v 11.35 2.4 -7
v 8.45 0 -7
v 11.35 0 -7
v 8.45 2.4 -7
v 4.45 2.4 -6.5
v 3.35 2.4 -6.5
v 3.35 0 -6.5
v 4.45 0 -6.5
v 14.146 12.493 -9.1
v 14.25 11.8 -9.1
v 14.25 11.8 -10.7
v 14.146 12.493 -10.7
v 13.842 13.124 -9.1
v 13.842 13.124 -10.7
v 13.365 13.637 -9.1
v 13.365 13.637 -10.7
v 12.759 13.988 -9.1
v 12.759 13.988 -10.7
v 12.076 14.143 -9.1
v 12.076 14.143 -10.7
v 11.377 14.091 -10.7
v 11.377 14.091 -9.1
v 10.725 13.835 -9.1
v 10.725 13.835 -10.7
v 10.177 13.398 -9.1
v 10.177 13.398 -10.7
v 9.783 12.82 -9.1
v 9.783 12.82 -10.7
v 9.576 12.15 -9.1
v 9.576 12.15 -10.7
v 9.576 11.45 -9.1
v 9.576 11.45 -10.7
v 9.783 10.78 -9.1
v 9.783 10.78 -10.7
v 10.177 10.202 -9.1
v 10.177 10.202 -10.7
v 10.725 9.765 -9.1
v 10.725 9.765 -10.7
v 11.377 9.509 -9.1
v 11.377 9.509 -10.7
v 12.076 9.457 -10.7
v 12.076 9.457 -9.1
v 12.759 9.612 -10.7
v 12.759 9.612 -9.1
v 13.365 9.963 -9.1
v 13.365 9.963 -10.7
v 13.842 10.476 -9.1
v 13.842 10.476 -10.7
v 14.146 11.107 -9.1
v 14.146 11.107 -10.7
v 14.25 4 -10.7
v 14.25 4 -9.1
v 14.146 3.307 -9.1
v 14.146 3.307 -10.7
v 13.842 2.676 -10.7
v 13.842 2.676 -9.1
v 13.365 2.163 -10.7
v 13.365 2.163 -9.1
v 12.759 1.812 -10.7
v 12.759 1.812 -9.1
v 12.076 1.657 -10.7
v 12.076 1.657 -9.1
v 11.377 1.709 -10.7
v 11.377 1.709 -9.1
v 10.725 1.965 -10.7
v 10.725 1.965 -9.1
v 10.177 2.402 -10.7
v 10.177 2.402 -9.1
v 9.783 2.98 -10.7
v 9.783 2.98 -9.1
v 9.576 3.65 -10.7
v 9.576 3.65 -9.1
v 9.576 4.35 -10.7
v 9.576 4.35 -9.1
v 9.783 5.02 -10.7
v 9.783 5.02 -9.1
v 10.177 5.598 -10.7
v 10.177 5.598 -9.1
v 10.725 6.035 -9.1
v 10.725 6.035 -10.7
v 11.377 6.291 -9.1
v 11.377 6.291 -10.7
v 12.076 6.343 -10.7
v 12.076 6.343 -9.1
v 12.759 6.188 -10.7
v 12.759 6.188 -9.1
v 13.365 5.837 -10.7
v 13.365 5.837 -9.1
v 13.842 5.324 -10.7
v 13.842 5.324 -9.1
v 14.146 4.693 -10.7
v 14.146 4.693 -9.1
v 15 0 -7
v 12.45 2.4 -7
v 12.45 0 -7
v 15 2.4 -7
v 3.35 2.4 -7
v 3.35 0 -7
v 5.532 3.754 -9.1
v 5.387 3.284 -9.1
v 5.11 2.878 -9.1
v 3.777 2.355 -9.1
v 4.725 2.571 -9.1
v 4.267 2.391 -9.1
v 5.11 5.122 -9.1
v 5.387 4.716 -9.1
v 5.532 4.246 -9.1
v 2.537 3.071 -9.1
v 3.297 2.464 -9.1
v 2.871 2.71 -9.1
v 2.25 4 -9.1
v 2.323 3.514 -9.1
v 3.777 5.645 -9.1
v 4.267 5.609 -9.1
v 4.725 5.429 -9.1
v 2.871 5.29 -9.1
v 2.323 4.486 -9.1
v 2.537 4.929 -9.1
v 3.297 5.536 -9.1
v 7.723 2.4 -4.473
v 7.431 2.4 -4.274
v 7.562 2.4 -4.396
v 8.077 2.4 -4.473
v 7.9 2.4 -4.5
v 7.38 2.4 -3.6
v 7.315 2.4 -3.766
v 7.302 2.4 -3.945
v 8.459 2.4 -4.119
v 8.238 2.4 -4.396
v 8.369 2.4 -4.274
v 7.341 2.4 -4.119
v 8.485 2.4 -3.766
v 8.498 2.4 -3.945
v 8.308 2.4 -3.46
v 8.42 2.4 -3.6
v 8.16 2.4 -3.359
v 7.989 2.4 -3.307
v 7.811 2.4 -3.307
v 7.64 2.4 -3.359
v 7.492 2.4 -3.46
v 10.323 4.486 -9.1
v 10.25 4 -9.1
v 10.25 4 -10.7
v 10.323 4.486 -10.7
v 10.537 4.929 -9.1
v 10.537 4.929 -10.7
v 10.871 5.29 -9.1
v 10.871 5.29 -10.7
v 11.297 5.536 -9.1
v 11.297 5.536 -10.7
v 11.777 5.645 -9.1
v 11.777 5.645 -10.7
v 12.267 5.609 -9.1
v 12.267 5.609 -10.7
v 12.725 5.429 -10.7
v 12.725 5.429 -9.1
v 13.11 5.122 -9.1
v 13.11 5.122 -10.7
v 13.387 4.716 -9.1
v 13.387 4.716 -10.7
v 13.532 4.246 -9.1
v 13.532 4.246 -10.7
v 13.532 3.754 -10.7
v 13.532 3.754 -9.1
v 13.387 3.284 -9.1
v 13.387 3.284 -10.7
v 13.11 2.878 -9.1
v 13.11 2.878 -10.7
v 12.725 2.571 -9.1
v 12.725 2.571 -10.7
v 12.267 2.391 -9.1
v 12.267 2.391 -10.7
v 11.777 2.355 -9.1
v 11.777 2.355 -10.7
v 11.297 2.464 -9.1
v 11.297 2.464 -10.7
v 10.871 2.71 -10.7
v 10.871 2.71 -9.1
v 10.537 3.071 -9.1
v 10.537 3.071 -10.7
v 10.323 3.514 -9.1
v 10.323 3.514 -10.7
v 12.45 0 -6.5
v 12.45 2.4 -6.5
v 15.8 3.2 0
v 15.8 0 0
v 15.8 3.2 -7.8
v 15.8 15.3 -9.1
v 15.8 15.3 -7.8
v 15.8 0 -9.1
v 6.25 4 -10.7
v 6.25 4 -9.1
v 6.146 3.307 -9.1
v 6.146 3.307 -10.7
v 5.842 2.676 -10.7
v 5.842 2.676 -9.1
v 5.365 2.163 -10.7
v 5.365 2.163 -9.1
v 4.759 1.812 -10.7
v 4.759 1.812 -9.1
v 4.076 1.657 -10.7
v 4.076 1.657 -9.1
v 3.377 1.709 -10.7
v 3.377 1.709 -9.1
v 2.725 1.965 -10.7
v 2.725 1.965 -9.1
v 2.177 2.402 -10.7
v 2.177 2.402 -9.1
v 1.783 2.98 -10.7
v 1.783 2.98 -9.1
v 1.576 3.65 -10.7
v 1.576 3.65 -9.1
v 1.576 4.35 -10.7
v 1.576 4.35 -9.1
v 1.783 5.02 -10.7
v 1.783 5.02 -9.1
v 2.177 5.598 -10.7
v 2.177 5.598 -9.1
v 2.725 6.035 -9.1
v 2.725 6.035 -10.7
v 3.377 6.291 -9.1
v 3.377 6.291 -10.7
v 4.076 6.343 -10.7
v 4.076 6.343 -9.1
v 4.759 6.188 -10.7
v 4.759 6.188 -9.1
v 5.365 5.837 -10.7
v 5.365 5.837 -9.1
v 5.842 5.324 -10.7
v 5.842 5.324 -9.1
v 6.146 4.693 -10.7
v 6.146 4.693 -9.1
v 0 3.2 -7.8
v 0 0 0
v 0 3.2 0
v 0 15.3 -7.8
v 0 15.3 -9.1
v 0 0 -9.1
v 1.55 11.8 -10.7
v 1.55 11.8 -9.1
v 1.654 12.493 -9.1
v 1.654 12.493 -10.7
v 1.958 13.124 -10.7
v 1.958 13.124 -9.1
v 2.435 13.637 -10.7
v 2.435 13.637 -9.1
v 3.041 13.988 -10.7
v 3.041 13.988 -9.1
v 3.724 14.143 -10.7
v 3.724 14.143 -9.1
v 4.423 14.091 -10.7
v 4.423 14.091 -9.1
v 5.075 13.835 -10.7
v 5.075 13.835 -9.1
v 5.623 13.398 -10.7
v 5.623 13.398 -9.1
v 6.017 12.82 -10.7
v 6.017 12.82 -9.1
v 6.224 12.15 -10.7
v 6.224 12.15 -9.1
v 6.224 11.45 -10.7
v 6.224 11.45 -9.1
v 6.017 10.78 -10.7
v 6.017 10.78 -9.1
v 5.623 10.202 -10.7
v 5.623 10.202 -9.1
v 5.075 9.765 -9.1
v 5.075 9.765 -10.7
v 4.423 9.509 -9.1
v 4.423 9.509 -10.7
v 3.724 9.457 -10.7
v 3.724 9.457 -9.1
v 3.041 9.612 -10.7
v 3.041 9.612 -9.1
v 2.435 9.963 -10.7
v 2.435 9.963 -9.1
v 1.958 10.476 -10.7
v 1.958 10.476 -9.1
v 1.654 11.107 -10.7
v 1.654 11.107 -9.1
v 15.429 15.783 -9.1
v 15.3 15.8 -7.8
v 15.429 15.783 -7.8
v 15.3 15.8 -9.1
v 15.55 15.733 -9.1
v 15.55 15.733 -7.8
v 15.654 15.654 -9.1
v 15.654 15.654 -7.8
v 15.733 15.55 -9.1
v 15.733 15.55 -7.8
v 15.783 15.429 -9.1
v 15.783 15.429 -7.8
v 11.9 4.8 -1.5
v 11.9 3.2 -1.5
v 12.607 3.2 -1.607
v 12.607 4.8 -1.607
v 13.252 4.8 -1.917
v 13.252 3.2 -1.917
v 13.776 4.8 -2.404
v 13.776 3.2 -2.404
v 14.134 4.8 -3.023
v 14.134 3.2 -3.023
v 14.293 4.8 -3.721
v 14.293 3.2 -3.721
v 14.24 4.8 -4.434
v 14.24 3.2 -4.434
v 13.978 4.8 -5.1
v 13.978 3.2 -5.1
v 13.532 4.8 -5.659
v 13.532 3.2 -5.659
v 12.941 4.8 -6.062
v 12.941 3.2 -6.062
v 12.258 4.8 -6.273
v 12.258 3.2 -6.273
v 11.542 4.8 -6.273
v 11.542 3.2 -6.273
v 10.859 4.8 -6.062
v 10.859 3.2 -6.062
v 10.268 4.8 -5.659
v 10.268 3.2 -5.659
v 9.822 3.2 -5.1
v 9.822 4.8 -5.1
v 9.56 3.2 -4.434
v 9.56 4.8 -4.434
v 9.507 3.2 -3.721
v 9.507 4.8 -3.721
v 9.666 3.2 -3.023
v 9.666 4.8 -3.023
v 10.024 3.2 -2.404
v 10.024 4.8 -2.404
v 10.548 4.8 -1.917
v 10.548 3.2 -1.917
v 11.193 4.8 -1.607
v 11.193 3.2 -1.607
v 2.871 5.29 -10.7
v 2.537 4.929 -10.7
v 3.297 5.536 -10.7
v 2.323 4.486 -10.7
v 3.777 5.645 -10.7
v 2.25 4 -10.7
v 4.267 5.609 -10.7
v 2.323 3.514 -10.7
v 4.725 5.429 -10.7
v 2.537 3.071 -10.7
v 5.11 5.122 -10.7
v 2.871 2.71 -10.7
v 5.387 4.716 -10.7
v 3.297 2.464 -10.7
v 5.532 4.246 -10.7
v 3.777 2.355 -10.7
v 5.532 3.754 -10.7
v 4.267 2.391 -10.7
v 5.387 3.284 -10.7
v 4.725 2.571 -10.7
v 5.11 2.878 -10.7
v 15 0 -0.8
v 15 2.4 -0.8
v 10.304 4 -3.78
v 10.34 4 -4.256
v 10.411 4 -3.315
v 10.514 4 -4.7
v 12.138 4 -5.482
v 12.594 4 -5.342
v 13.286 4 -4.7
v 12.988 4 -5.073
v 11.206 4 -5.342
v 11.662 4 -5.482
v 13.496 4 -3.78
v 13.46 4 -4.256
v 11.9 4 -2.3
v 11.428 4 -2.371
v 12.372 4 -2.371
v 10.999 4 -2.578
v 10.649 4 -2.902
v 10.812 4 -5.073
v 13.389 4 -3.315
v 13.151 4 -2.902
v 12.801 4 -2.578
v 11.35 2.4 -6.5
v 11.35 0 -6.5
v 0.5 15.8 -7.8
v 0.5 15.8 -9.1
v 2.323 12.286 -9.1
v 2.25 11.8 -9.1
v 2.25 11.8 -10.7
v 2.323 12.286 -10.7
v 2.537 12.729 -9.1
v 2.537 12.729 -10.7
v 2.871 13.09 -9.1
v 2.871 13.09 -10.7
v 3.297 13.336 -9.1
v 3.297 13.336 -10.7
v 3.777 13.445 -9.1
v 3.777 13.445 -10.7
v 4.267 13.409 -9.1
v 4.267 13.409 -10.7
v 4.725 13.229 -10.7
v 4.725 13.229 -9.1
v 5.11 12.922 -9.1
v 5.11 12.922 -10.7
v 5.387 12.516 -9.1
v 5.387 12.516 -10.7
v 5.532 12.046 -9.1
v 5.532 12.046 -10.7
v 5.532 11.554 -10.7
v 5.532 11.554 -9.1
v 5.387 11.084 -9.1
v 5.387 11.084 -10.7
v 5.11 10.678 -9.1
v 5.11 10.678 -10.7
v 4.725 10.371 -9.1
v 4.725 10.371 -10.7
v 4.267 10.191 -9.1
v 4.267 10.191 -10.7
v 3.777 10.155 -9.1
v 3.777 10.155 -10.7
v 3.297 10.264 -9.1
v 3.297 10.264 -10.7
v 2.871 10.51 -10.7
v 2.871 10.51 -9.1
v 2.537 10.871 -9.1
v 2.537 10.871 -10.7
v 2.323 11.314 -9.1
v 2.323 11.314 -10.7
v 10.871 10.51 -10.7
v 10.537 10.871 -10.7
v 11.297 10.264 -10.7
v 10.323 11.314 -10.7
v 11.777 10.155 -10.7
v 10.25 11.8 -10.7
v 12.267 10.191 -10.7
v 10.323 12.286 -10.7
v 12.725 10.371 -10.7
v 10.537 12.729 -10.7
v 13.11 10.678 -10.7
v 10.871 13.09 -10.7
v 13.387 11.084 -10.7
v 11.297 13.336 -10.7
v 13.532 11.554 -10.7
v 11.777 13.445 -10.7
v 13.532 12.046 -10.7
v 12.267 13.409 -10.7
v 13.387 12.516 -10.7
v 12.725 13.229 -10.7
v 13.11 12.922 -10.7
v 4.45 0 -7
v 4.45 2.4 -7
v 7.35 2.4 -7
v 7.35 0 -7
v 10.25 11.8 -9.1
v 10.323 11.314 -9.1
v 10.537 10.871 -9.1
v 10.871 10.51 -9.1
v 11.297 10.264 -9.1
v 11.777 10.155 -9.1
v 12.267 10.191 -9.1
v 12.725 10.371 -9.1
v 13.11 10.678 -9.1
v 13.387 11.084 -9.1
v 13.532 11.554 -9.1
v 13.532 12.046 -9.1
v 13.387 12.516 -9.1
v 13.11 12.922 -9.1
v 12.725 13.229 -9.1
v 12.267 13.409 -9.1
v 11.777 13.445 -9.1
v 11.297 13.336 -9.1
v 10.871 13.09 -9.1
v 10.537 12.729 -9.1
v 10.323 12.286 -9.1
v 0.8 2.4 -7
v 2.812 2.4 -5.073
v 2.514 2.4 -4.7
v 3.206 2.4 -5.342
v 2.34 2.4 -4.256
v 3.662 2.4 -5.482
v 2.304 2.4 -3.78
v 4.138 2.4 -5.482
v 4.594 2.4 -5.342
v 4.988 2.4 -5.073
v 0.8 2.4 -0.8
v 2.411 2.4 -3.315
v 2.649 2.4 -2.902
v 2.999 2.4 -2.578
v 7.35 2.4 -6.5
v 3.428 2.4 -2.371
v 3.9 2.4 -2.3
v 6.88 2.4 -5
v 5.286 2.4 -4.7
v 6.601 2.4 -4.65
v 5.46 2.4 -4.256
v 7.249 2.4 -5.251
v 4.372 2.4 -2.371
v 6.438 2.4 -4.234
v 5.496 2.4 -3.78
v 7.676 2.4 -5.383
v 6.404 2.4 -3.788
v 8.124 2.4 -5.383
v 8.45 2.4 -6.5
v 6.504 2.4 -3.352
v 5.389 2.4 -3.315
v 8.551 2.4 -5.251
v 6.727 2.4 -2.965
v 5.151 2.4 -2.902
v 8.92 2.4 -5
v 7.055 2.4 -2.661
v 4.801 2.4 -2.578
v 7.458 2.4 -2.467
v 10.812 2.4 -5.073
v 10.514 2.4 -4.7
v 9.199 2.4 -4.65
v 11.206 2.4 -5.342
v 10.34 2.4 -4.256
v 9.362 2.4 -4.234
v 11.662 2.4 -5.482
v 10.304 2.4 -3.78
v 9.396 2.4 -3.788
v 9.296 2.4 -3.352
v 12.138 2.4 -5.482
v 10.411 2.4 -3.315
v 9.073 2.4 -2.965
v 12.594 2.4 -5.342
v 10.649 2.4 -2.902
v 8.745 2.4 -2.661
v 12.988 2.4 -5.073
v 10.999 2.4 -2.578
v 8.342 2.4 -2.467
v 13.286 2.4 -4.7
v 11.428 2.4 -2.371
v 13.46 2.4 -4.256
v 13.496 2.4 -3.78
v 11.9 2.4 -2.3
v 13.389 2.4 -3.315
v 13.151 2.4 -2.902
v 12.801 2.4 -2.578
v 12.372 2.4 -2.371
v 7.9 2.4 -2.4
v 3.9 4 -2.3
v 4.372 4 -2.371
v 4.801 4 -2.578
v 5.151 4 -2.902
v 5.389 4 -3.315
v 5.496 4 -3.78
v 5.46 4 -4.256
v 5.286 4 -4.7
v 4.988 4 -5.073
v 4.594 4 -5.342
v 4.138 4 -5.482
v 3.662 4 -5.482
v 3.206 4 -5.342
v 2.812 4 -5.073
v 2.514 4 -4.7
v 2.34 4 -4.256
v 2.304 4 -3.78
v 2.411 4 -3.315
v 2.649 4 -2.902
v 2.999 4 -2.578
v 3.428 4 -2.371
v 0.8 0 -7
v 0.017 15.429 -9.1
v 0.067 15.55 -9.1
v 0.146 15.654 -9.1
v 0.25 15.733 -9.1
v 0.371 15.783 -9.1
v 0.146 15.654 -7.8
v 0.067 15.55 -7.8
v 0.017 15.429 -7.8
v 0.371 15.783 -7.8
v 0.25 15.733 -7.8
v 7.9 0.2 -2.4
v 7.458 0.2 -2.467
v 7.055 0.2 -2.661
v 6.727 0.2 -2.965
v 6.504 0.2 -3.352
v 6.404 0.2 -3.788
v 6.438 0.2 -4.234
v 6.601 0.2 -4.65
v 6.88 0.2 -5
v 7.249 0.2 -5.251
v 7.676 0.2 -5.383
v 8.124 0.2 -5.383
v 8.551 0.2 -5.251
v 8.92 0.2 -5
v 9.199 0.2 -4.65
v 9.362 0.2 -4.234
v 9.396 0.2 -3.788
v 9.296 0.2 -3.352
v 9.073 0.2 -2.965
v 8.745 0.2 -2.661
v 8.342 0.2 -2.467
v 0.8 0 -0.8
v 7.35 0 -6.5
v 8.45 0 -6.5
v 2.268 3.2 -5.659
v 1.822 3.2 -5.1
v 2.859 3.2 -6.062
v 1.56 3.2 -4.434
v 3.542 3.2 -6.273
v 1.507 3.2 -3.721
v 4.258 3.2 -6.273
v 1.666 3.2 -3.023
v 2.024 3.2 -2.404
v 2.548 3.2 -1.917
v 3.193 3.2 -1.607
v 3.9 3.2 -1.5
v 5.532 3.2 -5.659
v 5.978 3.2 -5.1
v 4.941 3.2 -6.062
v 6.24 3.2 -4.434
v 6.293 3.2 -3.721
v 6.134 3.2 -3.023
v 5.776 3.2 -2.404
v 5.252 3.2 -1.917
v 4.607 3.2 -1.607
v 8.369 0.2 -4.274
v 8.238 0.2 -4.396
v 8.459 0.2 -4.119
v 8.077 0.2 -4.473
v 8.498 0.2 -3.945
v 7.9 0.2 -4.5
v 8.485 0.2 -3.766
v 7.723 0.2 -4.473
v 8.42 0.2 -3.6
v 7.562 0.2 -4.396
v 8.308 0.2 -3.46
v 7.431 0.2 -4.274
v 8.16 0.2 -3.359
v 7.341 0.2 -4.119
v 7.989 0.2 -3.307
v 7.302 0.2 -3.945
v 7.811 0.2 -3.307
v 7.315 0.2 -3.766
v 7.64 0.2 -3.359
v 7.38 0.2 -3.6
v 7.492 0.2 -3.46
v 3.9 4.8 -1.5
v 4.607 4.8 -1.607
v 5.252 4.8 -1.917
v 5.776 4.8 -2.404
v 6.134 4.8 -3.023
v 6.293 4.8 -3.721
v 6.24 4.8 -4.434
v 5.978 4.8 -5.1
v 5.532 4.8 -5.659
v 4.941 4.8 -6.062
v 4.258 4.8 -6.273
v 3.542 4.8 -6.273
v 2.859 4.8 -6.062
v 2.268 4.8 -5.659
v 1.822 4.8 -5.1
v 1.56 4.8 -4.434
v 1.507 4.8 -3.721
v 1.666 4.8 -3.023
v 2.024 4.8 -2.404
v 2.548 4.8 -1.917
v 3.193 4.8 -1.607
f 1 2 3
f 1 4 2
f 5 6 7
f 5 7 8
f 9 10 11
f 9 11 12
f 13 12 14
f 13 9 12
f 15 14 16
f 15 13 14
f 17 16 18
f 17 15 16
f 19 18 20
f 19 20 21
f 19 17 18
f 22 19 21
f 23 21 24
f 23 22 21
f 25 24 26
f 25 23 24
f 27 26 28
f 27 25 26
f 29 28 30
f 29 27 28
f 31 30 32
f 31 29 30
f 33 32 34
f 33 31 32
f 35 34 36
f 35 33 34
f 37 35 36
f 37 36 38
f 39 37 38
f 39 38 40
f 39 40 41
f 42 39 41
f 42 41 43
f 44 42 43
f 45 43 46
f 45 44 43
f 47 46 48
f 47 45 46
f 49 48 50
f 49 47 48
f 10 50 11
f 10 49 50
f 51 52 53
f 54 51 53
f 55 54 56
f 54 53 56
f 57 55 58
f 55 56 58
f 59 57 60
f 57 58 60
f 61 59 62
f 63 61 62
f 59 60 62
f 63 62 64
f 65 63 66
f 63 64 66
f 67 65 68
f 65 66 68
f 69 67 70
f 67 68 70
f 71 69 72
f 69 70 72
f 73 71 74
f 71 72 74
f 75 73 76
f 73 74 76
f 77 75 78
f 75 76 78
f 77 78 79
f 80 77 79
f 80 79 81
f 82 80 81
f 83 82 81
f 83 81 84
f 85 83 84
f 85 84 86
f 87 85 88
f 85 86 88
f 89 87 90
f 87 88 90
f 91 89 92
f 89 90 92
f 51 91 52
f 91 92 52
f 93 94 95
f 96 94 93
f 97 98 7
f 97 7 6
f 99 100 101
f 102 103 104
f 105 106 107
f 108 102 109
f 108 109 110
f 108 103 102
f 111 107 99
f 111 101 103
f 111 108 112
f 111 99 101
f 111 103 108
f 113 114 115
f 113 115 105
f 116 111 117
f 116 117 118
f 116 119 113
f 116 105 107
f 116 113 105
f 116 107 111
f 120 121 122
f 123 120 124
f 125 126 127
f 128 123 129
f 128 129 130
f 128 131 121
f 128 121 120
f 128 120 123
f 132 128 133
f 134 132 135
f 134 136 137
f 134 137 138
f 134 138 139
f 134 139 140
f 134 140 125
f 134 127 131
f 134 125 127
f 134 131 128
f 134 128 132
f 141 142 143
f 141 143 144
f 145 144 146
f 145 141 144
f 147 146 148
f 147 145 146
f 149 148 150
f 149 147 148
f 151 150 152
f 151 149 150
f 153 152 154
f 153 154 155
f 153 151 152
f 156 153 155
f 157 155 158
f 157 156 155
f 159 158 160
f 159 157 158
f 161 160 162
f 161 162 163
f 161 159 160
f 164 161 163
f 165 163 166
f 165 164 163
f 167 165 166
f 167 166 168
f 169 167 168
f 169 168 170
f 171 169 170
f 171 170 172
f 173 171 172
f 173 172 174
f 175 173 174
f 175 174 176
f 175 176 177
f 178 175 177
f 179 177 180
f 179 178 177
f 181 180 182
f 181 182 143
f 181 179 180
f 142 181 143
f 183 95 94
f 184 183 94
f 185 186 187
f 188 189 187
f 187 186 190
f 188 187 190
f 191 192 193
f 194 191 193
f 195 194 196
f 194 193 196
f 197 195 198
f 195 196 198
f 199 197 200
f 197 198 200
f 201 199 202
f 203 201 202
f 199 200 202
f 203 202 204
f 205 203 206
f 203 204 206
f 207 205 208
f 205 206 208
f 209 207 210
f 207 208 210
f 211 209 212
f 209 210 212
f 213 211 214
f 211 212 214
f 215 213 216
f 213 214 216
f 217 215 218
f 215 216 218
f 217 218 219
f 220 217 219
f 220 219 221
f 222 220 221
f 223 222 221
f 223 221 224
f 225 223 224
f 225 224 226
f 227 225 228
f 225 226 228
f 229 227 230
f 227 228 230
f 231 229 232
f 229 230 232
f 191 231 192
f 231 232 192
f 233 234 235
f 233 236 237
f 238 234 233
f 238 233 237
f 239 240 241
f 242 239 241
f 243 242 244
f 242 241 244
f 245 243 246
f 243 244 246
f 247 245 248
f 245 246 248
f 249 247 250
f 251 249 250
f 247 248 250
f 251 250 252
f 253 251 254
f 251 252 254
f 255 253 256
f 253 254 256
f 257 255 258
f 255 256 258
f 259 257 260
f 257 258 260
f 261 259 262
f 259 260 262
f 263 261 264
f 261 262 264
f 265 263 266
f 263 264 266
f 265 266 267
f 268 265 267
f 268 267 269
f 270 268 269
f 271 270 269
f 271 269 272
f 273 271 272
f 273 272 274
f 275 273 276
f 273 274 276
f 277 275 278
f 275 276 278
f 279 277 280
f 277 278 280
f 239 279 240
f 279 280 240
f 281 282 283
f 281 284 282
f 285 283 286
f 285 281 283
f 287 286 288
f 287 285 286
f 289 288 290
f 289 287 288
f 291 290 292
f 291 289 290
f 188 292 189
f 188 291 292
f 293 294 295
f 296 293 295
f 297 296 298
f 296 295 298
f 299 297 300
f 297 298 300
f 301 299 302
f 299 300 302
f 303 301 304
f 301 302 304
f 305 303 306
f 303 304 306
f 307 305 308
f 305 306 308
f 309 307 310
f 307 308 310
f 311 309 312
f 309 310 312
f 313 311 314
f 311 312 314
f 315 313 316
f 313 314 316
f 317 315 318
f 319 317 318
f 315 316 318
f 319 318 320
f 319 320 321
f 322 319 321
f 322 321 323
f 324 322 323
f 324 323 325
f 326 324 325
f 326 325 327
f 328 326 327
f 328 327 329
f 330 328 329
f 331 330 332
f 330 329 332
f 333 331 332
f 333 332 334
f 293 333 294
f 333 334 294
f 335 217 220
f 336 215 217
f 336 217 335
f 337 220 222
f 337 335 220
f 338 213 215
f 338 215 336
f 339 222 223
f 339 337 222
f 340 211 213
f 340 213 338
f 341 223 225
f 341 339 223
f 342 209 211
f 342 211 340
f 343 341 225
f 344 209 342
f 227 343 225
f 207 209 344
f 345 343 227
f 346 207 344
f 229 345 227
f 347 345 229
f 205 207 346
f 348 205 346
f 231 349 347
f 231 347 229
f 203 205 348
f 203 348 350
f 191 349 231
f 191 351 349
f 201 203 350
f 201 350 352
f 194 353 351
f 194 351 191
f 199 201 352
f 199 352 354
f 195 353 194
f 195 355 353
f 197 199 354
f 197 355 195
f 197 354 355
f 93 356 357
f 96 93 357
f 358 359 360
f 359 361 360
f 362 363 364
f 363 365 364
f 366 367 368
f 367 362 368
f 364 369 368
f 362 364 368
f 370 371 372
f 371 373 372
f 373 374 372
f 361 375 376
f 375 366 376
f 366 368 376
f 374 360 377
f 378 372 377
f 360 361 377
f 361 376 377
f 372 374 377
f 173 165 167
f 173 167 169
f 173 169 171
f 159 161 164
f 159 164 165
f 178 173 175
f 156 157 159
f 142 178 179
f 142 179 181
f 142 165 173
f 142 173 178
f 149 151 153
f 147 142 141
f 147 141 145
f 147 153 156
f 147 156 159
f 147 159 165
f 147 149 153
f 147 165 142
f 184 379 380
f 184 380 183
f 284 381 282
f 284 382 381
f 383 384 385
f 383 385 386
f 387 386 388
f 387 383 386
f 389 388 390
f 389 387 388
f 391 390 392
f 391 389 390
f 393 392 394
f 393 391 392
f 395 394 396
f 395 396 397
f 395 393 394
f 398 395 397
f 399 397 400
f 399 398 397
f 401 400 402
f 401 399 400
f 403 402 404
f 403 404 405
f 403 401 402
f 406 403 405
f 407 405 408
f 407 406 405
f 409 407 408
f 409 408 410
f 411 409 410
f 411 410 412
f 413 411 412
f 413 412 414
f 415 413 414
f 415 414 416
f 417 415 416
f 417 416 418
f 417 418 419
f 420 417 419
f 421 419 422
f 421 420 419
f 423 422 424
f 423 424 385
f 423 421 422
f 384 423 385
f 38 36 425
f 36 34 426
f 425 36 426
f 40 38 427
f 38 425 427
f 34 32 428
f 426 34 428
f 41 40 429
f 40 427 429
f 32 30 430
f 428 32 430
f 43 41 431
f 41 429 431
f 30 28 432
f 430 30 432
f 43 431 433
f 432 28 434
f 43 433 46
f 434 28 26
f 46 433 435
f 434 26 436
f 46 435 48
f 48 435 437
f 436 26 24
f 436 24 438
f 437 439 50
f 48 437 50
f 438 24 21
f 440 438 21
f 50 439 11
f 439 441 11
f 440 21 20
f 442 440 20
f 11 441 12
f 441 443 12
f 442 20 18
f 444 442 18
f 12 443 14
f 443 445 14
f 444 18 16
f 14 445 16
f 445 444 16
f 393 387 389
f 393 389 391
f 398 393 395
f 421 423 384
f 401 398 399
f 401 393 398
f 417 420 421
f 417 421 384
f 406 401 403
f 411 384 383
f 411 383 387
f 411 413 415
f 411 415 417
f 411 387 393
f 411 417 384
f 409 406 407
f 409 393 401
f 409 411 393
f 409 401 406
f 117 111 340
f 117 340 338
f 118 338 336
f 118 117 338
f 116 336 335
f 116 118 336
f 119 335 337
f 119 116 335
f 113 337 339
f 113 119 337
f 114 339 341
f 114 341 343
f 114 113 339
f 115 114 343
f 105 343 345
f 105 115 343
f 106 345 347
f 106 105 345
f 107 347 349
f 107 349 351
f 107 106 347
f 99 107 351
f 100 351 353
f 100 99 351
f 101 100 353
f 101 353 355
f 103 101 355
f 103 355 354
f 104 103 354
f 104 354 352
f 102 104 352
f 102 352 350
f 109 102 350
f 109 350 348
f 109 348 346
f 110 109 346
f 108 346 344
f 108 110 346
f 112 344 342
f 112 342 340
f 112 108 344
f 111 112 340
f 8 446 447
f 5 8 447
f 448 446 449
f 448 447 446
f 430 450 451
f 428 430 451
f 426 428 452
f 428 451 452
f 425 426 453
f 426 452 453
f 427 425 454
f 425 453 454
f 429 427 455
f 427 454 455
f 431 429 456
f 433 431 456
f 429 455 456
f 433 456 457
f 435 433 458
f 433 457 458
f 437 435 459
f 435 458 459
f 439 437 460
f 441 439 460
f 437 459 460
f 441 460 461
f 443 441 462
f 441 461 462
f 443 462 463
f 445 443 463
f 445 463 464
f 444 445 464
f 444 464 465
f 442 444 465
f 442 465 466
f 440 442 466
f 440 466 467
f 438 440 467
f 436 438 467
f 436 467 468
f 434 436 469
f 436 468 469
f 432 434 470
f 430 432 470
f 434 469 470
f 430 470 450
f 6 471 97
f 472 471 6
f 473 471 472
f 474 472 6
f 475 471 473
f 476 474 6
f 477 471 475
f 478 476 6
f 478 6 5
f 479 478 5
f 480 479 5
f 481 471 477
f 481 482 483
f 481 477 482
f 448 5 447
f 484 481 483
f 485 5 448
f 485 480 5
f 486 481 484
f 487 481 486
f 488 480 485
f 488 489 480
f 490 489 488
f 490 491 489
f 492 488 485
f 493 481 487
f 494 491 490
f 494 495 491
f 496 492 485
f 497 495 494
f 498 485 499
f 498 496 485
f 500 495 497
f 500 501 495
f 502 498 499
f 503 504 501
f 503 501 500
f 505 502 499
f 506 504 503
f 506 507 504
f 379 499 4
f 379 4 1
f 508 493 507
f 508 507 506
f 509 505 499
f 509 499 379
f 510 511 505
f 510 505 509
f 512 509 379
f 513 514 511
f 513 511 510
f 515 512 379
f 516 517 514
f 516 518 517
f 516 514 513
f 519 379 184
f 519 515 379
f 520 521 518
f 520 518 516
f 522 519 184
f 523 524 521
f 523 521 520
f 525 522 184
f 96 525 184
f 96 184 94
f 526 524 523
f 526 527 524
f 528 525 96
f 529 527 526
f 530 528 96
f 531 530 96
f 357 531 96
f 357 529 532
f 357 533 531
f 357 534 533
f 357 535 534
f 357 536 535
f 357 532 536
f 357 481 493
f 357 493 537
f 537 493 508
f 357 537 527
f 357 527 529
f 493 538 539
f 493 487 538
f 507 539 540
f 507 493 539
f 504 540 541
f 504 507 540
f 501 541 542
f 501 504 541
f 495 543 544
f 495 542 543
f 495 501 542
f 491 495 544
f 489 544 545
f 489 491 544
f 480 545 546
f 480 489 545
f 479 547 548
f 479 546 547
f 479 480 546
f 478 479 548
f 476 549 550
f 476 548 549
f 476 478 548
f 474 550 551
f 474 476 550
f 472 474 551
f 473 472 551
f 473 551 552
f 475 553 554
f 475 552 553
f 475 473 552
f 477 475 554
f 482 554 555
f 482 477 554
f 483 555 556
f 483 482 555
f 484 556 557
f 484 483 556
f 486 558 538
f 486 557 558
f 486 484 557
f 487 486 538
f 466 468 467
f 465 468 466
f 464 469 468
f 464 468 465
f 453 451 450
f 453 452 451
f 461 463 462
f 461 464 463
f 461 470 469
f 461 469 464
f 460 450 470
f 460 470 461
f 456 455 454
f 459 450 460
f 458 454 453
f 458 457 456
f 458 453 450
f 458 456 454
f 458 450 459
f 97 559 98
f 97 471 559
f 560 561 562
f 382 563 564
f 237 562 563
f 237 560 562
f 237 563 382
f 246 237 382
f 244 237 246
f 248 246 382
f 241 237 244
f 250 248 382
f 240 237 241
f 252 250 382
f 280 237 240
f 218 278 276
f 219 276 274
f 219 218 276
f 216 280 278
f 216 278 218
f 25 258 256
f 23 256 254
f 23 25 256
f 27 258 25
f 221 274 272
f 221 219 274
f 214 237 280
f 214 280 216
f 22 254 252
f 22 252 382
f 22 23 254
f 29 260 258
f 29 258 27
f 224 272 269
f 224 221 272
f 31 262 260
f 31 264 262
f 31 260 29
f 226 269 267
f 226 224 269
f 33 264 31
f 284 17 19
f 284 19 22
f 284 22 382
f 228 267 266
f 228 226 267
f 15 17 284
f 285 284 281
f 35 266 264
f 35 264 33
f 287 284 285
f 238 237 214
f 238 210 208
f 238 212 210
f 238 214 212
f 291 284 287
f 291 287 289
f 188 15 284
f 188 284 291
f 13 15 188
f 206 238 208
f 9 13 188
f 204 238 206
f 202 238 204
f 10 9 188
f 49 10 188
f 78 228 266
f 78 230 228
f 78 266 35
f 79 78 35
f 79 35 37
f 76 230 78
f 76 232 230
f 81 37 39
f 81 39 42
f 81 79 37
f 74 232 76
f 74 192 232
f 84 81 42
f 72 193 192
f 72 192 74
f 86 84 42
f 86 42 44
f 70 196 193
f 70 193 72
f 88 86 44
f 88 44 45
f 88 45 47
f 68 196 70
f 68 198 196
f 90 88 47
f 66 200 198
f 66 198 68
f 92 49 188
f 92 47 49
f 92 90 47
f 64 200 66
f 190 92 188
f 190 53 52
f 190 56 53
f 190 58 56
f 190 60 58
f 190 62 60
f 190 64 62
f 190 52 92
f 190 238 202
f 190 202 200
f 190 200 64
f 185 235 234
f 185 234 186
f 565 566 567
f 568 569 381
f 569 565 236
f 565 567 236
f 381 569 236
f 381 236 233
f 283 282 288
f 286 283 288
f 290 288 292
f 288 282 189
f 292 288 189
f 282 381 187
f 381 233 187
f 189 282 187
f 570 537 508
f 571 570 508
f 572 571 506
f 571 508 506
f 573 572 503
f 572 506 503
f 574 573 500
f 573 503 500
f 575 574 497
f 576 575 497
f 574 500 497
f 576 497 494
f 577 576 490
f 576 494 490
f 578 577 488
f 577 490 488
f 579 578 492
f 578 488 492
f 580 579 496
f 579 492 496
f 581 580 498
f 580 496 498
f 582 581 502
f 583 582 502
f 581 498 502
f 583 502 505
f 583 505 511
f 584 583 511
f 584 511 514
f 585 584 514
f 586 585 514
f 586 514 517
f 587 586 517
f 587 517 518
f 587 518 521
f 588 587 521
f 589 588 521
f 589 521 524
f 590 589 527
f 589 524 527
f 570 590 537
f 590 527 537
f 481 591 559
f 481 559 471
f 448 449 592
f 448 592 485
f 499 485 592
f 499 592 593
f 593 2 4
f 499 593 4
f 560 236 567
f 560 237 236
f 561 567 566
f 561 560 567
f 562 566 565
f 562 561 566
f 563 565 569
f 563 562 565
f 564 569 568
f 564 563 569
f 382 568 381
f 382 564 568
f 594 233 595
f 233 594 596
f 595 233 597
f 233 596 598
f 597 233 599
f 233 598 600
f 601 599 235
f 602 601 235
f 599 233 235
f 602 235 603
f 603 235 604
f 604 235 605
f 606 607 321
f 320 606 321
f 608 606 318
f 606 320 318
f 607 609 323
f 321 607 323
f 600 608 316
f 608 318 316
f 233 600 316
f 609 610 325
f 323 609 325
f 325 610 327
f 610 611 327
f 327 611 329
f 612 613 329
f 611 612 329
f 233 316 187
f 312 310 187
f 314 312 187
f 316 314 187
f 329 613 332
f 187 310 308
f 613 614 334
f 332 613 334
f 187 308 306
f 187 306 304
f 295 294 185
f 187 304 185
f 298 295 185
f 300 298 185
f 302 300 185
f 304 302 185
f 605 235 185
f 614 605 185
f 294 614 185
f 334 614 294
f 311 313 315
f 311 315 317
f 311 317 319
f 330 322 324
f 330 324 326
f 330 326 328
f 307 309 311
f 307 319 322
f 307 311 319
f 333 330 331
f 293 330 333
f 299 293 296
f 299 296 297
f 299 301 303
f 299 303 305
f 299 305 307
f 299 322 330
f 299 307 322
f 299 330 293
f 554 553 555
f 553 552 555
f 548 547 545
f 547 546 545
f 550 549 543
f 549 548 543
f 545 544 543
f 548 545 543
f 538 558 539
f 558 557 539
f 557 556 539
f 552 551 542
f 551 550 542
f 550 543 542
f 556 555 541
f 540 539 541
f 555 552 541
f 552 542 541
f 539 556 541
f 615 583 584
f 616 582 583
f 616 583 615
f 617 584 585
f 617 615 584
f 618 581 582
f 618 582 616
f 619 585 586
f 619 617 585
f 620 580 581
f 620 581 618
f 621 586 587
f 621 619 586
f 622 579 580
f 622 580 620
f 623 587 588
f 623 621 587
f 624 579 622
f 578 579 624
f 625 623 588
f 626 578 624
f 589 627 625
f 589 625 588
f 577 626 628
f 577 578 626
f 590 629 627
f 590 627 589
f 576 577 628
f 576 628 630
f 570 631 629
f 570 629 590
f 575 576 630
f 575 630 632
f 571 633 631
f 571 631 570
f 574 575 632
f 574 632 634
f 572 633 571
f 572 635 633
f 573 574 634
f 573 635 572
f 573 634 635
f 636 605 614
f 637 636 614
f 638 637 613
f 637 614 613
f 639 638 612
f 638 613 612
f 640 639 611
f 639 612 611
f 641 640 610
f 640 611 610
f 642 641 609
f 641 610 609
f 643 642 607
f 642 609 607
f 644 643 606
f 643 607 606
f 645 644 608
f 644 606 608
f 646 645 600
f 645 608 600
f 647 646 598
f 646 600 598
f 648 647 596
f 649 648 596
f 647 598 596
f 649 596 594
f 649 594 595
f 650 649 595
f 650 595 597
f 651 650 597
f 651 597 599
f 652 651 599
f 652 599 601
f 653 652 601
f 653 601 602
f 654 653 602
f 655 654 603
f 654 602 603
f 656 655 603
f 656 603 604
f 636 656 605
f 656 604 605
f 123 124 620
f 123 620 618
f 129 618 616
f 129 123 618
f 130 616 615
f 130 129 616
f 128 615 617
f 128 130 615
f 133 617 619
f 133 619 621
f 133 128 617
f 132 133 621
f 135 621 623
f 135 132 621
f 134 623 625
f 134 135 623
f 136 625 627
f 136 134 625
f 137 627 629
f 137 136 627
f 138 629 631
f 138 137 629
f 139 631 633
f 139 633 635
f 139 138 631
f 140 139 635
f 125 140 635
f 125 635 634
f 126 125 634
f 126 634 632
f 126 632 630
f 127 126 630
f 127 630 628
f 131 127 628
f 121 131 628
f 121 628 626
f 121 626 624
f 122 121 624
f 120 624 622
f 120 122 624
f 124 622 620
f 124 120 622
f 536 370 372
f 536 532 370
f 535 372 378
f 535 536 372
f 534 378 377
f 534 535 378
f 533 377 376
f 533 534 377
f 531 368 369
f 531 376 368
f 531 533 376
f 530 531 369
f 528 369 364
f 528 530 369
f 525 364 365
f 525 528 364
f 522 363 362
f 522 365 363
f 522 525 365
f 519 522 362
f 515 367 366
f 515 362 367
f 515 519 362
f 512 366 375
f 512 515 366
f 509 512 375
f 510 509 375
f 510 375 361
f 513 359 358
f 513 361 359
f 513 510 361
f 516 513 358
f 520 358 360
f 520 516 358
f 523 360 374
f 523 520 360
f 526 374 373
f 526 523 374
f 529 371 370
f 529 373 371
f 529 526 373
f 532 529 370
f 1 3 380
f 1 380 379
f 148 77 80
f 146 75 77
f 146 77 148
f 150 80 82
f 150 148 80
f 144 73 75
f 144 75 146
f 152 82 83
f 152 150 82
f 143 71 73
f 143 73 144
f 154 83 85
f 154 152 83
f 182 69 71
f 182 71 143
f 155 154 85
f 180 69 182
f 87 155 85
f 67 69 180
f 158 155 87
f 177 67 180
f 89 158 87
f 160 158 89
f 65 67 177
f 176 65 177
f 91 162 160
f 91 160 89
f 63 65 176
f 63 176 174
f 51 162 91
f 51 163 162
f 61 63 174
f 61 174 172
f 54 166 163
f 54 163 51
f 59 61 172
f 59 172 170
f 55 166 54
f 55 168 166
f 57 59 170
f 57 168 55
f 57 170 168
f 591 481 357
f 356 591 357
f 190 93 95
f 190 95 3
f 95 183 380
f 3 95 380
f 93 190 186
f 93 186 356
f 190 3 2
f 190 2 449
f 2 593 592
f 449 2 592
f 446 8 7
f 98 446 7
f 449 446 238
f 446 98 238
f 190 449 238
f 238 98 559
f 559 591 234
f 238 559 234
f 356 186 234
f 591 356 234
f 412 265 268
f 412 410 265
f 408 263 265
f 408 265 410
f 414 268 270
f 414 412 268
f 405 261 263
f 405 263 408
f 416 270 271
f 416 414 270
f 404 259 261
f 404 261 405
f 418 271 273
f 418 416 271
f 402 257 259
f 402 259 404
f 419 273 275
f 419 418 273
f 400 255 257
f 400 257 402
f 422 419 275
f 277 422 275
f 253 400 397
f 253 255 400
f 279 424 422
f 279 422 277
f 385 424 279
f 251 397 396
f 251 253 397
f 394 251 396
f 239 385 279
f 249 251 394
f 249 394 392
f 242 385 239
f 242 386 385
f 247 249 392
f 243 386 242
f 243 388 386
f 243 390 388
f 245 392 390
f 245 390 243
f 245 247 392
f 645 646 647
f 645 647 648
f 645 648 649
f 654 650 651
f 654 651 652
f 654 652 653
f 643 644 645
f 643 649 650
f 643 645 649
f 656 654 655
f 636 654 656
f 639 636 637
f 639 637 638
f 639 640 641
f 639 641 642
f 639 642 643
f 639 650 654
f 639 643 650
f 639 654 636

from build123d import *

# Parameters (mm, degrees)
SKETCH1_W                 = 15.8
SKETCH1_H                 = 3.2
BOSS_EXTRUDE1_DEPTH       = 7.8
SKETCH2_R                 = 2.4
BOSS_EXTRUDE2_DEPTH       = 1.6
LPATTERN1_COUNT           = 2
LPATTERN1_PITCH           = 8
LPATTERN1_COUNT_DIR2      = 4
LPATTERN1_PITCH_DIR2      = 8
SHELL1_T                  = -0.8
SKETCH3_R                 = 1.5
SKETCH3_R_2               = 0.6
BOSS_EXTRUDE3_DEPTH       = 2.2
SKETCH4_W                 = 15.8
SKETCH4_H                 = 7.9
BOSS_EXTRUDE4_DEPTH       = 1.3
SKETCH5_R                 = 2.35
SKETCH5_R_2               = 1.65
BOSS_EXTRUDE5_DEPTH       = 1.6
LPATTERN2_COUNT           = 2
LPATTERN2_PITCH           = 8
SKETCH7_W                 = 1.1
SKETCH7_H                 = 2.4
BOSS_EXTRUDE6_DEPTH       = 0.5
LPATTERN3_COUNT           = 3
LPATTERN3_PITCH           = 4
SKETCH8_W                 = 15.8
SKETCH8_H                 = 1.3
BOSS_EXTRUDE7_DEPTH       = 7.9
MIRROR1_COPY_1_SKETCH_R   = 2.35
MIRROR1_COPY_1_SKETCH_R_2 = 1.65
MIRROR1_COPY_1_DEPTH      = 1.6
FILLET2_R                 = 0.5


with BuildPart() as part:
    # Sketch1 → Boss-Extrude1 (new body)
    with BuildSketch(Plane.XY):
        with Locations((7.9, 1.6)):
            Rectangle(SKETCH1_W, SKETCH1_H)
    extrude(amount=-BOSS_EXTRUDE1_DEPTH)

    # Sketch2 → Boss-Extrude2 (add)
    with BuildSketch(Plane(origin=(0, 3.2, 0), x_dir=(1, 0, 0), z_dir=(0, 1, 0))):
        with Locations(Location((3.9, 3.9, 0), (0, 0, 270))):
            Circle(SKETCH2_R)
    boss_extrude2 = extrude(amount=BOSS_EXTRUDE2_DEPTH)

    # LPattern1: Boss-Extrude2 2 × 4, 6 skipped
    with Locations(*[(j * LPATTERN1_PITCH_DIR2, 0, i * LPATTERN1_PITCH) for i in range(LPATTERN1_COUNT) for j in range(LPATTERN1_COUNT_DIR2) if (i, j) not in ((0, 0), (0, 2), (0, 3), (1, 0), (1, 1), (1, 2), (1, 3))]):
        add(boss_extrude2)

    # Shell1
    shell1_openings = [part.faces().sort_by_distance(p)[0] for p in [
        (7.9, 0, -3.9),
    ]]
    offset(amount=SHELL1_T, openings=shell1_openings, kind=Kind.INTERSECTION)

    # Sketch3 → Boss-Extrude3 (add)
    with BuildSketch(Plane.XZ.offset(-2.4)):
        with Locations(Location((7.9, -3.9, 0), (0, 0, 90))):
            Circle(SKETCH3_R)
        with Locations(Location((7.9, -3.9, 0), (0, 0, 270))):
            Circle(SKETCH3_R_2, mode=Mode.SUBTRACT)
    extrude(amount=BOSS_EXTRUDE3_DEPTH)

    # Sketch4 → Boss-Extrude4 (add)
    with BuildSketch(Plane(origin=(0, 0, -7.8), x_dir=(-1, 0, 0), z_dir=(0, 0, -1))):
        with Locations((-7.9, 3.95)):
            Rectangle(SKETCH4_W, SKETCH4_H)
    extrude(amount=BOSS_EXTRUDE4_DEPTH)

    # Sketch5 → Boss-Extrude5 (add)
    with BuildSketch(Plane(origin=(0, 0, -9.1), x_dir=(-1, 0, 0), z_dir=(0, 0, -1))):
        with Locations(Location((-11.9, 4, 0), (0, 0, 180))):
            Circle(SKETCH5_R)
        with Locations((-11.9, 4)):
            Circle(SKETCH5_R_2, mode=Mode.SUBTRACT)
    boss_extrude5 = extrude(amount=BOSS_EXTRUDE5_DEPTH)

    # LPattern2: Boss-Extrude5 ×2
    with Locations(*[(-i * LPATTERN2_PITCH, 0, 0) for i in range(1, LPATTERN2_COUNT)]):
        add(boss_extrude5)

    # Sketch7 → Boss-Extrude6 (add)
    with BuildSketch(Plane.XY.offset(-7)):
        with Locations((11.9, 1.2)):
            Rectangle(SKETCH7_W, SKETCH7_H)
    boss_extrude6 = extrude(amount=BOSS_EXTRUDE6_DEPTH)

    # LPattern3: Boss-Extrude6 ×3
    with Locations(*[(-i * LPATTERN3_PITCH, 0, 0) for i in range(1, LPATTERN3_COUNT)]):
        add(boss_extrude6)

    # Sketch8 → Boss-Extrude7 (add)
    with BuildSketch(Plane(origin=(0, 7.9, 0), x_dir=(1, 0, 0), z_dir=(0, 1, 0))):
        with Locations((7.9, 8.45)):
            Rectangle(SKETCH8_W, SKETCH8_H)
    extrude(amount=BOSS_EXTRUDE7_DEPTH)

    # Mirror1: Boss-Extrude5 across plane
    add(boss_extrude5.mirror(Plane.ZX.offset(7.9)))

    # Mirror1 copy 1 sketch → Mirror1 copy 1 (add)
    with BuildSketch(Plane(origin=(-8, 15.8, -9.1), x_dir=(-1, 0, 0), z_dir=(0, 0, -1))):
        with Locations((-11.9, -4)):
            Circle(MIRROR1_COPY_1_SKETCH_R)
        with Locations((-11.9, -4)):
            Circle(MIRROR1_COPY_1_SKETCH_R_2, mode=Mode.SUBTRACT)
    extrude(amount=MIRROR1_COPY_1_DEPTH)

    # Fillet2
    fillet2_edges = [part.edges().sort_by_distance(p)[0] for p in [
        (0, 15.8, -8.45),
        (15.8, 15.8, -8.45),
    ]]
    fillet(fillet2_edges, radius=FILLET2_R)


solid = part.part
